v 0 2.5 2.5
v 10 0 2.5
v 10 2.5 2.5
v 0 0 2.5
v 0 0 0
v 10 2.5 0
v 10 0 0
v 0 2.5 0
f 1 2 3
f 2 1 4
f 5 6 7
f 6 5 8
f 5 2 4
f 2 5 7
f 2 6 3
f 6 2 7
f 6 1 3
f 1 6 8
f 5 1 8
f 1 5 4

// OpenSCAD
// the most complex CAD model you've ever seen!
cube(size=[10, 2.5, 2.5]);
